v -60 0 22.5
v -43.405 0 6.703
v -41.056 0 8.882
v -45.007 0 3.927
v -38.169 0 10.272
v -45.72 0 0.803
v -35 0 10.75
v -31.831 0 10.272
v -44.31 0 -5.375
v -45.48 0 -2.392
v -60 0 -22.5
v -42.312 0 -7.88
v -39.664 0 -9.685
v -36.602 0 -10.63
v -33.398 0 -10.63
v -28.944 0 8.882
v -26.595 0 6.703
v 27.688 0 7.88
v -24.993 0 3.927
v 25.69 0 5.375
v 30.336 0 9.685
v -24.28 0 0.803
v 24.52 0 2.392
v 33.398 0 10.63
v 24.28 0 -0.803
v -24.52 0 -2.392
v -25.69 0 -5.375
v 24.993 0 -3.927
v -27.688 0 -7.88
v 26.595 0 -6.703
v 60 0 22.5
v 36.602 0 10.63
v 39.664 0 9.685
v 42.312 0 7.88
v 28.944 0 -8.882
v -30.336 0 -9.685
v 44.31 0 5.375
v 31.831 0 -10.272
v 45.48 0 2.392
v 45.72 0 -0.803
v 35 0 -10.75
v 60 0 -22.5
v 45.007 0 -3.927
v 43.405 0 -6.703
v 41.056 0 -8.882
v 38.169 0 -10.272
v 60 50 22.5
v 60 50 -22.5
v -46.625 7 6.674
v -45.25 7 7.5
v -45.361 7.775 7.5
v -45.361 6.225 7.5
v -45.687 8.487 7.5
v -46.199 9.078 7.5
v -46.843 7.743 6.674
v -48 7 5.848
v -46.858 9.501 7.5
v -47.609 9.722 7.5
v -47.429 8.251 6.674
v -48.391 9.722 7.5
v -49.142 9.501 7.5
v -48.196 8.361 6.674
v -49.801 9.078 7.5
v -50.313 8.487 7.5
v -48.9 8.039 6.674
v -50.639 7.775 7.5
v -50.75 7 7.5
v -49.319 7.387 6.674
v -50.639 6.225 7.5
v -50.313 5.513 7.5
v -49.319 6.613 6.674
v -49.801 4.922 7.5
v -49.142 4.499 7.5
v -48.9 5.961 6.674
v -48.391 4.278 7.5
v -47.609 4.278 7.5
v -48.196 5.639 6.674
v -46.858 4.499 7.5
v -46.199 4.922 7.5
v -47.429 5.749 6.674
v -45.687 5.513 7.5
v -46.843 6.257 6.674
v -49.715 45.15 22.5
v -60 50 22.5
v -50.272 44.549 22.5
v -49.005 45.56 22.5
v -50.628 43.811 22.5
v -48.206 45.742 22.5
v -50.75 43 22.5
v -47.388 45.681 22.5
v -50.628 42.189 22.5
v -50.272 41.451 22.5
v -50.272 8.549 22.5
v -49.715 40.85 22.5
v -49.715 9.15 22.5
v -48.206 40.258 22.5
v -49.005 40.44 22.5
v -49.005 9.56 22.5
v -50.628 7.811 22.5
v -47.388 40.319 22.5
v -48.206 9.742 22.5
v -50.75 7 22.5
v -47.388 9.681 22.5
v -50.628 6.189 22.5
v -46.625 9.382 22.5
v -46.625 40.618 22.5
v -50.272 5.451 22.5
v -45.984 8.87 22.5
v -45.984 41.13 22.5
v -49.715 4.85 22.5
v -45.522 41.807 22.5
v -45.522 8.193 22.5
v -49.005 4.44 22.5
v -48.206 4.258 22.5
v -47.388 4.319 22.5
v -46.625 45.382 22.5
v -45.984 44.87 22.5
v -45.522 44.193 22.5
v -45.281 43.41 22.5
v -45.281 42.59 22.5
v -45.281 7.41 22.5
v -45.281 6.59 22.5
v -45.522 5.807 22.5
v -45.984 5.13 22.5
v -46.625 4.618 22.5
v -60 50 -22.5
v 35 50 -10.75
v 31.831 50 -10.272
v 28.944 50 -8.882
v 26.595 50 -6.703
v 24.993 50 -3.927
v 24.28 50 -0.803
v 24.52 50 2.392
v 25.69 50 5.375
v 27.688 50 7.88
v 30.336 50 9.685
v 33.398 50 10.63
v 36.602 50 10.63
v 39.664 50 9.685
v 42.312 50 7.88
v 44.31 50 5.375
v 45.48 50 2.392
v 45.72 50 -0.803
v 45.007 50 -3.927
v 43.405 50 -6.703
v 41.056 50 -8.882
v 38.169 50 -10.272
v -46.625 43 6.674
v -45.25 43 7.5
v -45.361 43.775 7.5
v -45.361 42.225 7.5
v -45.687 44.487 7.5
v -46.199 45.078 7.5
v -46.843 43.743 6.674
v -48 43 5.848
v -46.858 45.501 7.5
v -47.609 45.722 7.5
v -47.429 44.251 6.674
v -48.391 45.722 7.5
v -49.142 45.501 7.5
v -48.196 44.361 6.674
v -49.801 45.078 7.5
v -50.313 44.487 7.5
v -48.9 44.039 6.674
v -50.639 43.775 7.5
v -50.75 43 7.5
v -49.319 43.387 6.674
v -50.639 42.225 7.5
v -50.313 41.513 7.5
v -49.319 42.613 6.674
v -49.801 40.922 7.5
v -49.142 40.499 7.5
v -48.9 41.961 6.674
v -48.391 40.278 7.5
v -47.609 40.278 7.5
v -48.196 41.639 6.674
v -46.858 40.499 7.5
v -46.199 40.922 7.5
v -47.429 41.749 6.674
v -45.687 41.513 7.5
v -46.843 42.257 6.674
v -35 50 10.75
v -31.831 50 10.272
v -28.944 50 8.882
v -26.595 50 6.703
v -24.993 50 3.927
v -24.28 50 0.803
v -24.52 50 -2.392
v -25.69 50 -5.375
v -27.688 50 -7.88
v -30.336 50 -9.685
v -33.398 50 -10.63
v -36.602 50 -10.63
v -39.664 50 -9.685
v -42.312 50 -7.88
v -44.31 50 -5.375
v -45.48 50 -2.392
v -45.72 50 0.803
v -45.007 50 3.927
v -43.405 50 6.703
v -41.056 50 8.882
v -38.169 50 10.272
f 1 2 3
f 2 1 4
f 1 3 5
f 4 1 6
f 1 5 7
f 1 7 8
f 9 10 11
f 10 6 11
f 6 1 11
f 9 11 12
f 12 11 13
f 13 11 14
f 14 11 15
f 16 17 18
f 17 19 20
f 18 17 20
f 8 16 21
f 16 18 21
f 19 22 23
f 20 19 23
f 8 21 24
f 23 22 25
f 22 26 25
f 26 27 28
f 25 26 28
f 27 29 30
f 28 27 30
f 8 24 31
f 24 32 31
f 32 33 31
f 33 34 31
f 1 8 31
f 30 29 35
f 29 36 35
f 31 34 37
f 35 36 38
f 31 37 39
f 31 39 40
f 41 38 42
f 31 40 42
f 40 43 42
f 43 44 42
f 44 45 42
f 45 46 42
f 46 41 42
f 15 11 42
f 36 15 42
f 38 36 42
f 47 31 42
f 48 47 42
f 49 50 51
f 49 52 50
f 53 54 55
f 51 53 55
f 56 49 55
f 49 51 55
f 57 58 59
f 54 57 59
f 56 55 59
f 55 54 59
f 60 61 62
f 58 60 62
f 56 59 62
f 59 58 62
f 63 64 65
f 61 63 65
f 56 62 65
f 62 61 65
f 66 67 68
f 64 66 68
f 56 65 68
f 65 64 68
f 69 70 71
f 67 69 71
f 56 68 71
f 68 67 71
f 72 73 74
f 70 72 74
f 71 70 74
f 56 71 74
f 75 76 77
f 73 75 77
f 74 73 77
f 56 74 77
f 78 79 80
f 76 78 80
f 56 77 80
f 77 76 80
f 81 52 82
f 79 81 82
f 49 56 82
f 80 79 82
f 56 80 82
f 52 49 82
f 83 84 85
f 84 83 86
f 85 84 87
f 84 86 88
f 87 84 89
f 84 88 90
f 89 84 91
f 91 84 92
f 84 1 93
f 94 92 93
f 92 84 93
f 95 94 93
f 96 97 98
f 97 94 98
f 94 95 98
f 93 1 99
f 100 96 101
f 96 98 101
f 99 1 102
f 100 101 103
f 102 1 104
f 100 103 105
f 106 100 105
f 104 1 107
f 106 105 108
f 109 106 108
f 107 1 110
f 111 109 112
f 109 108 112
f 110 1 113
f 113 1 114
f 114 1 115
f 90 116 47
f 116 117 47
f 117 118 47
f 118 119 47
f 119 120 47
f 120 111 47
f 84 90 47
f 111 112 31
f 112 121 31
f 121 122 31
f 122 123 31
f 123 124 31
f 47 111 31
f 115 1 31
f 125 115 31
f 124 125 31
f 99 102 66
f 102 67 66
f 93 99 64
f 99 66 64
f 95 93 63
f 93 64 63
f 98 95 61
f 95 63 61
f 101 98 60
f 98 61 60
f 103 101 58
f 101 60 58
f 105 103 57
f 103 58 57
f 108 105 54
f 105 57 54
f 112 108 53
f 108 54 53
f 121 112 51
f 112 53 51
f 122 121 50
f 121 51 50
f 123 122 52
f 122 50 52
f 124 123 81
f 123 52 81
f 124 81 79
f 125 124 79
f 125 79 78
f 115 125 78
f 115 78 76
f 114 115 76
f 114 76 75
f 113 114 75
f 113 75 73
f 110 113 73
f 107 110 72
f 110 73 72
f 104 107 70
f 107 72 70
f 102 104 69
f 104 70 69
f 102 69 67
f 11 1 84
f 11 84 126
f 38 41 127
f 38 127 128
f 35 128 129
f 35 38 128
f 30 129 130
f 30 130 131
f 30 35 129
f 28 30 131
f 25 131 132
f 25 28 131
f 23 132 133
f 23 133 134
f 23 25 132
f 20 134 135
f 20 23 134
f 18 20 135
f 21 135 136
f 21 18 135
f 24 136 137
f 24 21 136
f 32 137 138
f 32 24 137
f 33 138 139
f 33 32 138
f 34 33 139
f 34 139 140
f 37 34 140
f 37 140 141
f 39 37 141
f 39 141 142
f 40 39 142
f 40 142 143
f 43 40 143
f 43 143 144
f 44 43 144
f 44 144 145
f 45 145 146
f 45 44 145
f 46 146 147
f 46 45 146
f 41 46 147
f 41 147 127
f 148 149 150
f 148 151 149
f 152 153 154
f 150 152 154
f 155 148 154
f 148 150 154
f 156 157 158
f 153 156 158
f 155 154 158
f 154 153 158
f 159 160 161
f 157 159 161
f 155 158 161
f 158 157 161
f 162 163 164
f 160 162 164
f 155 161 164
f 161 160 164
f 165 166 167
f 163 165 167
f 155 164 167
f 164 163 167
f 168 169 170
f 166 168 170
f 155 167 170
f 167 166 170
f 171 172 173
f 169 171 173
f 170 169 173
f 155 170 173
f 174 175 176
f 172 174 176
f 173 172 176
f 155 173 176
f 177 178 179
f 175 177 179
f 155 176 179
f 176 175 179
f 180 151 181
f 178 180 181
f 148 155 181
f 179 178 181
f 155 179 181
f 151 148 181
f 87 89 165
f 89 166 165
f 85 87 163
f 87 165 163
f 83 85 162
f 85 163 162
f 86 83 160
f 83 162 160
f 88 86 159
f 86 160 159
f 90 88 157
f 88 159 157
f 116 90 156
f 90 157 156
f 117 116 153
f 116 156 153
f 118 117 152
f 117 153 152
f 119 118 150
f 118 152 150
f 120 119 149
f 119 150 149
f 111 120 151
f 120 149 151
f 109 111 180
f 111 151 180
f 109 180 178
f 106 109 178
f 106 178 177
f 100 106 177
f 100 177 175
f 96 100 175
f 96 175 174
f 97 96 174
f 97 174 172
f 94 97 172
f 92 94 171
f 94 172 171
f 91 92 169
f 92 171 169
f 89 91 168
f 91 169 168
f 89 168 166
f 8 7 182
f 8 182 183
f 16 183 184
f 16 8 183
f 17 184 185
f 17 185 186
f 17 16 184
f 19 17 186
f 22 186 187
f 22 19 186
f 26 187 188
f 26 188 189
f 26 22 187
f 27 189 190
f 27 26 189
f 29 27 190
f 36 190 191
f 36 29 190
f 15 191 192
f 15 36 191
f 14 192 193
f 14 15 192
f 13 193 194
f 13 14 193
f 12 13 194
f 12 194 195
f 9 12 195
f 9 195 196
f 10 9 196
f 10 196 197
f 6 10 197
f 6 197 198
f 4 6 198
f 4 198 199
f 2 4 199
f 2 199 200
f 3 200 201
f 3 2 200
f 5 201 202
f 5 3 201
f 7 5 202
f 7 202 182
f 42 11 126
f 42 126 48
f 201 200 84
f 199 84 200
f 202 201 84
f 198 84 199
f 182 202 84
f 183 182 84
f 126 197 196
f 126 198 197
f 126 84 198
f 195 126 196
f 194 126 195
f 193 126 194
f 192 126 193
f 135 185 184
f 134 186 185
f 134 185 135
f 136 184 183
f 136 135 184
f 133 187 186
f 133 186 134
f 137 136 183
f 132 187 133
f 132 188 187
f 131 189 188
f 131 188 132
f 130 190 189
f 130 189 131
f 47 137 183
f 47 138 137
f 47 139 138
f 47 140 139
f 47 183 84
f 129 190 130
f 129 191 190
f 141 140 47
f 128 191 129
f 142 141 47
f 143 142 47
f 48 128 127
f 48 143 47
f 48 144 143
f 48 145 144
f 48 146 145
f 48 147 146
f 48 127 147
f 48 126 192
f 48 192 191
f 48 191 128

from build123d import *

# Parameters (mm, degrees)
SKETCH_1_W             = 120
SKETCH_1_H             = 45
SKETCH_1_R             = 10.75
EXTRUDE_1_DEPTH        = 50
HOLE_WIZARD_M6_1_D     = 5.5
HOLE_WIZARD_M6_1_DEPTH = 15
HOLE_WIZARD_M6_1_TIP   = 1.652366702


with BuildPart() as part:
    # 草图1 → 凸台-拉伸1 (new body)
    with BuildSketch(Plane(origin=(0, 0, 0), x_dir=(1, 0, 0), z_dir=(0, 1, 0))):
        Rectangle(SKETCH_1_W, SKETCH_1_H)
        with Locations(Location((-35, 0, 0), (0, 0, 270))):
            Circle(SKETCH_1_R, mode=Mode.SUBTRACT)
        with Locations(Location((35, 0, 0), (0, 0, 90))):
            Circle(SKETCH_1_R, mode=Mode.SUBTRACT)
    extrude(amount=EXTRUDE_1_DEPTH)

    # M6 螺纹孔1
    with Locations(Plane(origin=(-48, 43, 22.5), x_dir=(1, 0, 0), z_dir=(0, 0, 1))):
        with Locations((0, 0), (0, -36)):
            Hole(HOLE_WIZARD_M6_1_D / 2, depth=HOLE_WIZARD_M6_1_DEPTH)
            with Locations((0, 0, -(HOLE_WIZARD_M6_1_DEPTH + HOLE_WIZARD_M6_1_TIP / 2))):  # 118° drill point
                Cone(0, HOLE_WIZARD_M6_1_D / 2, HOLE_WIZARD_M6_1_TIP, mode=Mode.SUBTRACT)


solid = part.part
